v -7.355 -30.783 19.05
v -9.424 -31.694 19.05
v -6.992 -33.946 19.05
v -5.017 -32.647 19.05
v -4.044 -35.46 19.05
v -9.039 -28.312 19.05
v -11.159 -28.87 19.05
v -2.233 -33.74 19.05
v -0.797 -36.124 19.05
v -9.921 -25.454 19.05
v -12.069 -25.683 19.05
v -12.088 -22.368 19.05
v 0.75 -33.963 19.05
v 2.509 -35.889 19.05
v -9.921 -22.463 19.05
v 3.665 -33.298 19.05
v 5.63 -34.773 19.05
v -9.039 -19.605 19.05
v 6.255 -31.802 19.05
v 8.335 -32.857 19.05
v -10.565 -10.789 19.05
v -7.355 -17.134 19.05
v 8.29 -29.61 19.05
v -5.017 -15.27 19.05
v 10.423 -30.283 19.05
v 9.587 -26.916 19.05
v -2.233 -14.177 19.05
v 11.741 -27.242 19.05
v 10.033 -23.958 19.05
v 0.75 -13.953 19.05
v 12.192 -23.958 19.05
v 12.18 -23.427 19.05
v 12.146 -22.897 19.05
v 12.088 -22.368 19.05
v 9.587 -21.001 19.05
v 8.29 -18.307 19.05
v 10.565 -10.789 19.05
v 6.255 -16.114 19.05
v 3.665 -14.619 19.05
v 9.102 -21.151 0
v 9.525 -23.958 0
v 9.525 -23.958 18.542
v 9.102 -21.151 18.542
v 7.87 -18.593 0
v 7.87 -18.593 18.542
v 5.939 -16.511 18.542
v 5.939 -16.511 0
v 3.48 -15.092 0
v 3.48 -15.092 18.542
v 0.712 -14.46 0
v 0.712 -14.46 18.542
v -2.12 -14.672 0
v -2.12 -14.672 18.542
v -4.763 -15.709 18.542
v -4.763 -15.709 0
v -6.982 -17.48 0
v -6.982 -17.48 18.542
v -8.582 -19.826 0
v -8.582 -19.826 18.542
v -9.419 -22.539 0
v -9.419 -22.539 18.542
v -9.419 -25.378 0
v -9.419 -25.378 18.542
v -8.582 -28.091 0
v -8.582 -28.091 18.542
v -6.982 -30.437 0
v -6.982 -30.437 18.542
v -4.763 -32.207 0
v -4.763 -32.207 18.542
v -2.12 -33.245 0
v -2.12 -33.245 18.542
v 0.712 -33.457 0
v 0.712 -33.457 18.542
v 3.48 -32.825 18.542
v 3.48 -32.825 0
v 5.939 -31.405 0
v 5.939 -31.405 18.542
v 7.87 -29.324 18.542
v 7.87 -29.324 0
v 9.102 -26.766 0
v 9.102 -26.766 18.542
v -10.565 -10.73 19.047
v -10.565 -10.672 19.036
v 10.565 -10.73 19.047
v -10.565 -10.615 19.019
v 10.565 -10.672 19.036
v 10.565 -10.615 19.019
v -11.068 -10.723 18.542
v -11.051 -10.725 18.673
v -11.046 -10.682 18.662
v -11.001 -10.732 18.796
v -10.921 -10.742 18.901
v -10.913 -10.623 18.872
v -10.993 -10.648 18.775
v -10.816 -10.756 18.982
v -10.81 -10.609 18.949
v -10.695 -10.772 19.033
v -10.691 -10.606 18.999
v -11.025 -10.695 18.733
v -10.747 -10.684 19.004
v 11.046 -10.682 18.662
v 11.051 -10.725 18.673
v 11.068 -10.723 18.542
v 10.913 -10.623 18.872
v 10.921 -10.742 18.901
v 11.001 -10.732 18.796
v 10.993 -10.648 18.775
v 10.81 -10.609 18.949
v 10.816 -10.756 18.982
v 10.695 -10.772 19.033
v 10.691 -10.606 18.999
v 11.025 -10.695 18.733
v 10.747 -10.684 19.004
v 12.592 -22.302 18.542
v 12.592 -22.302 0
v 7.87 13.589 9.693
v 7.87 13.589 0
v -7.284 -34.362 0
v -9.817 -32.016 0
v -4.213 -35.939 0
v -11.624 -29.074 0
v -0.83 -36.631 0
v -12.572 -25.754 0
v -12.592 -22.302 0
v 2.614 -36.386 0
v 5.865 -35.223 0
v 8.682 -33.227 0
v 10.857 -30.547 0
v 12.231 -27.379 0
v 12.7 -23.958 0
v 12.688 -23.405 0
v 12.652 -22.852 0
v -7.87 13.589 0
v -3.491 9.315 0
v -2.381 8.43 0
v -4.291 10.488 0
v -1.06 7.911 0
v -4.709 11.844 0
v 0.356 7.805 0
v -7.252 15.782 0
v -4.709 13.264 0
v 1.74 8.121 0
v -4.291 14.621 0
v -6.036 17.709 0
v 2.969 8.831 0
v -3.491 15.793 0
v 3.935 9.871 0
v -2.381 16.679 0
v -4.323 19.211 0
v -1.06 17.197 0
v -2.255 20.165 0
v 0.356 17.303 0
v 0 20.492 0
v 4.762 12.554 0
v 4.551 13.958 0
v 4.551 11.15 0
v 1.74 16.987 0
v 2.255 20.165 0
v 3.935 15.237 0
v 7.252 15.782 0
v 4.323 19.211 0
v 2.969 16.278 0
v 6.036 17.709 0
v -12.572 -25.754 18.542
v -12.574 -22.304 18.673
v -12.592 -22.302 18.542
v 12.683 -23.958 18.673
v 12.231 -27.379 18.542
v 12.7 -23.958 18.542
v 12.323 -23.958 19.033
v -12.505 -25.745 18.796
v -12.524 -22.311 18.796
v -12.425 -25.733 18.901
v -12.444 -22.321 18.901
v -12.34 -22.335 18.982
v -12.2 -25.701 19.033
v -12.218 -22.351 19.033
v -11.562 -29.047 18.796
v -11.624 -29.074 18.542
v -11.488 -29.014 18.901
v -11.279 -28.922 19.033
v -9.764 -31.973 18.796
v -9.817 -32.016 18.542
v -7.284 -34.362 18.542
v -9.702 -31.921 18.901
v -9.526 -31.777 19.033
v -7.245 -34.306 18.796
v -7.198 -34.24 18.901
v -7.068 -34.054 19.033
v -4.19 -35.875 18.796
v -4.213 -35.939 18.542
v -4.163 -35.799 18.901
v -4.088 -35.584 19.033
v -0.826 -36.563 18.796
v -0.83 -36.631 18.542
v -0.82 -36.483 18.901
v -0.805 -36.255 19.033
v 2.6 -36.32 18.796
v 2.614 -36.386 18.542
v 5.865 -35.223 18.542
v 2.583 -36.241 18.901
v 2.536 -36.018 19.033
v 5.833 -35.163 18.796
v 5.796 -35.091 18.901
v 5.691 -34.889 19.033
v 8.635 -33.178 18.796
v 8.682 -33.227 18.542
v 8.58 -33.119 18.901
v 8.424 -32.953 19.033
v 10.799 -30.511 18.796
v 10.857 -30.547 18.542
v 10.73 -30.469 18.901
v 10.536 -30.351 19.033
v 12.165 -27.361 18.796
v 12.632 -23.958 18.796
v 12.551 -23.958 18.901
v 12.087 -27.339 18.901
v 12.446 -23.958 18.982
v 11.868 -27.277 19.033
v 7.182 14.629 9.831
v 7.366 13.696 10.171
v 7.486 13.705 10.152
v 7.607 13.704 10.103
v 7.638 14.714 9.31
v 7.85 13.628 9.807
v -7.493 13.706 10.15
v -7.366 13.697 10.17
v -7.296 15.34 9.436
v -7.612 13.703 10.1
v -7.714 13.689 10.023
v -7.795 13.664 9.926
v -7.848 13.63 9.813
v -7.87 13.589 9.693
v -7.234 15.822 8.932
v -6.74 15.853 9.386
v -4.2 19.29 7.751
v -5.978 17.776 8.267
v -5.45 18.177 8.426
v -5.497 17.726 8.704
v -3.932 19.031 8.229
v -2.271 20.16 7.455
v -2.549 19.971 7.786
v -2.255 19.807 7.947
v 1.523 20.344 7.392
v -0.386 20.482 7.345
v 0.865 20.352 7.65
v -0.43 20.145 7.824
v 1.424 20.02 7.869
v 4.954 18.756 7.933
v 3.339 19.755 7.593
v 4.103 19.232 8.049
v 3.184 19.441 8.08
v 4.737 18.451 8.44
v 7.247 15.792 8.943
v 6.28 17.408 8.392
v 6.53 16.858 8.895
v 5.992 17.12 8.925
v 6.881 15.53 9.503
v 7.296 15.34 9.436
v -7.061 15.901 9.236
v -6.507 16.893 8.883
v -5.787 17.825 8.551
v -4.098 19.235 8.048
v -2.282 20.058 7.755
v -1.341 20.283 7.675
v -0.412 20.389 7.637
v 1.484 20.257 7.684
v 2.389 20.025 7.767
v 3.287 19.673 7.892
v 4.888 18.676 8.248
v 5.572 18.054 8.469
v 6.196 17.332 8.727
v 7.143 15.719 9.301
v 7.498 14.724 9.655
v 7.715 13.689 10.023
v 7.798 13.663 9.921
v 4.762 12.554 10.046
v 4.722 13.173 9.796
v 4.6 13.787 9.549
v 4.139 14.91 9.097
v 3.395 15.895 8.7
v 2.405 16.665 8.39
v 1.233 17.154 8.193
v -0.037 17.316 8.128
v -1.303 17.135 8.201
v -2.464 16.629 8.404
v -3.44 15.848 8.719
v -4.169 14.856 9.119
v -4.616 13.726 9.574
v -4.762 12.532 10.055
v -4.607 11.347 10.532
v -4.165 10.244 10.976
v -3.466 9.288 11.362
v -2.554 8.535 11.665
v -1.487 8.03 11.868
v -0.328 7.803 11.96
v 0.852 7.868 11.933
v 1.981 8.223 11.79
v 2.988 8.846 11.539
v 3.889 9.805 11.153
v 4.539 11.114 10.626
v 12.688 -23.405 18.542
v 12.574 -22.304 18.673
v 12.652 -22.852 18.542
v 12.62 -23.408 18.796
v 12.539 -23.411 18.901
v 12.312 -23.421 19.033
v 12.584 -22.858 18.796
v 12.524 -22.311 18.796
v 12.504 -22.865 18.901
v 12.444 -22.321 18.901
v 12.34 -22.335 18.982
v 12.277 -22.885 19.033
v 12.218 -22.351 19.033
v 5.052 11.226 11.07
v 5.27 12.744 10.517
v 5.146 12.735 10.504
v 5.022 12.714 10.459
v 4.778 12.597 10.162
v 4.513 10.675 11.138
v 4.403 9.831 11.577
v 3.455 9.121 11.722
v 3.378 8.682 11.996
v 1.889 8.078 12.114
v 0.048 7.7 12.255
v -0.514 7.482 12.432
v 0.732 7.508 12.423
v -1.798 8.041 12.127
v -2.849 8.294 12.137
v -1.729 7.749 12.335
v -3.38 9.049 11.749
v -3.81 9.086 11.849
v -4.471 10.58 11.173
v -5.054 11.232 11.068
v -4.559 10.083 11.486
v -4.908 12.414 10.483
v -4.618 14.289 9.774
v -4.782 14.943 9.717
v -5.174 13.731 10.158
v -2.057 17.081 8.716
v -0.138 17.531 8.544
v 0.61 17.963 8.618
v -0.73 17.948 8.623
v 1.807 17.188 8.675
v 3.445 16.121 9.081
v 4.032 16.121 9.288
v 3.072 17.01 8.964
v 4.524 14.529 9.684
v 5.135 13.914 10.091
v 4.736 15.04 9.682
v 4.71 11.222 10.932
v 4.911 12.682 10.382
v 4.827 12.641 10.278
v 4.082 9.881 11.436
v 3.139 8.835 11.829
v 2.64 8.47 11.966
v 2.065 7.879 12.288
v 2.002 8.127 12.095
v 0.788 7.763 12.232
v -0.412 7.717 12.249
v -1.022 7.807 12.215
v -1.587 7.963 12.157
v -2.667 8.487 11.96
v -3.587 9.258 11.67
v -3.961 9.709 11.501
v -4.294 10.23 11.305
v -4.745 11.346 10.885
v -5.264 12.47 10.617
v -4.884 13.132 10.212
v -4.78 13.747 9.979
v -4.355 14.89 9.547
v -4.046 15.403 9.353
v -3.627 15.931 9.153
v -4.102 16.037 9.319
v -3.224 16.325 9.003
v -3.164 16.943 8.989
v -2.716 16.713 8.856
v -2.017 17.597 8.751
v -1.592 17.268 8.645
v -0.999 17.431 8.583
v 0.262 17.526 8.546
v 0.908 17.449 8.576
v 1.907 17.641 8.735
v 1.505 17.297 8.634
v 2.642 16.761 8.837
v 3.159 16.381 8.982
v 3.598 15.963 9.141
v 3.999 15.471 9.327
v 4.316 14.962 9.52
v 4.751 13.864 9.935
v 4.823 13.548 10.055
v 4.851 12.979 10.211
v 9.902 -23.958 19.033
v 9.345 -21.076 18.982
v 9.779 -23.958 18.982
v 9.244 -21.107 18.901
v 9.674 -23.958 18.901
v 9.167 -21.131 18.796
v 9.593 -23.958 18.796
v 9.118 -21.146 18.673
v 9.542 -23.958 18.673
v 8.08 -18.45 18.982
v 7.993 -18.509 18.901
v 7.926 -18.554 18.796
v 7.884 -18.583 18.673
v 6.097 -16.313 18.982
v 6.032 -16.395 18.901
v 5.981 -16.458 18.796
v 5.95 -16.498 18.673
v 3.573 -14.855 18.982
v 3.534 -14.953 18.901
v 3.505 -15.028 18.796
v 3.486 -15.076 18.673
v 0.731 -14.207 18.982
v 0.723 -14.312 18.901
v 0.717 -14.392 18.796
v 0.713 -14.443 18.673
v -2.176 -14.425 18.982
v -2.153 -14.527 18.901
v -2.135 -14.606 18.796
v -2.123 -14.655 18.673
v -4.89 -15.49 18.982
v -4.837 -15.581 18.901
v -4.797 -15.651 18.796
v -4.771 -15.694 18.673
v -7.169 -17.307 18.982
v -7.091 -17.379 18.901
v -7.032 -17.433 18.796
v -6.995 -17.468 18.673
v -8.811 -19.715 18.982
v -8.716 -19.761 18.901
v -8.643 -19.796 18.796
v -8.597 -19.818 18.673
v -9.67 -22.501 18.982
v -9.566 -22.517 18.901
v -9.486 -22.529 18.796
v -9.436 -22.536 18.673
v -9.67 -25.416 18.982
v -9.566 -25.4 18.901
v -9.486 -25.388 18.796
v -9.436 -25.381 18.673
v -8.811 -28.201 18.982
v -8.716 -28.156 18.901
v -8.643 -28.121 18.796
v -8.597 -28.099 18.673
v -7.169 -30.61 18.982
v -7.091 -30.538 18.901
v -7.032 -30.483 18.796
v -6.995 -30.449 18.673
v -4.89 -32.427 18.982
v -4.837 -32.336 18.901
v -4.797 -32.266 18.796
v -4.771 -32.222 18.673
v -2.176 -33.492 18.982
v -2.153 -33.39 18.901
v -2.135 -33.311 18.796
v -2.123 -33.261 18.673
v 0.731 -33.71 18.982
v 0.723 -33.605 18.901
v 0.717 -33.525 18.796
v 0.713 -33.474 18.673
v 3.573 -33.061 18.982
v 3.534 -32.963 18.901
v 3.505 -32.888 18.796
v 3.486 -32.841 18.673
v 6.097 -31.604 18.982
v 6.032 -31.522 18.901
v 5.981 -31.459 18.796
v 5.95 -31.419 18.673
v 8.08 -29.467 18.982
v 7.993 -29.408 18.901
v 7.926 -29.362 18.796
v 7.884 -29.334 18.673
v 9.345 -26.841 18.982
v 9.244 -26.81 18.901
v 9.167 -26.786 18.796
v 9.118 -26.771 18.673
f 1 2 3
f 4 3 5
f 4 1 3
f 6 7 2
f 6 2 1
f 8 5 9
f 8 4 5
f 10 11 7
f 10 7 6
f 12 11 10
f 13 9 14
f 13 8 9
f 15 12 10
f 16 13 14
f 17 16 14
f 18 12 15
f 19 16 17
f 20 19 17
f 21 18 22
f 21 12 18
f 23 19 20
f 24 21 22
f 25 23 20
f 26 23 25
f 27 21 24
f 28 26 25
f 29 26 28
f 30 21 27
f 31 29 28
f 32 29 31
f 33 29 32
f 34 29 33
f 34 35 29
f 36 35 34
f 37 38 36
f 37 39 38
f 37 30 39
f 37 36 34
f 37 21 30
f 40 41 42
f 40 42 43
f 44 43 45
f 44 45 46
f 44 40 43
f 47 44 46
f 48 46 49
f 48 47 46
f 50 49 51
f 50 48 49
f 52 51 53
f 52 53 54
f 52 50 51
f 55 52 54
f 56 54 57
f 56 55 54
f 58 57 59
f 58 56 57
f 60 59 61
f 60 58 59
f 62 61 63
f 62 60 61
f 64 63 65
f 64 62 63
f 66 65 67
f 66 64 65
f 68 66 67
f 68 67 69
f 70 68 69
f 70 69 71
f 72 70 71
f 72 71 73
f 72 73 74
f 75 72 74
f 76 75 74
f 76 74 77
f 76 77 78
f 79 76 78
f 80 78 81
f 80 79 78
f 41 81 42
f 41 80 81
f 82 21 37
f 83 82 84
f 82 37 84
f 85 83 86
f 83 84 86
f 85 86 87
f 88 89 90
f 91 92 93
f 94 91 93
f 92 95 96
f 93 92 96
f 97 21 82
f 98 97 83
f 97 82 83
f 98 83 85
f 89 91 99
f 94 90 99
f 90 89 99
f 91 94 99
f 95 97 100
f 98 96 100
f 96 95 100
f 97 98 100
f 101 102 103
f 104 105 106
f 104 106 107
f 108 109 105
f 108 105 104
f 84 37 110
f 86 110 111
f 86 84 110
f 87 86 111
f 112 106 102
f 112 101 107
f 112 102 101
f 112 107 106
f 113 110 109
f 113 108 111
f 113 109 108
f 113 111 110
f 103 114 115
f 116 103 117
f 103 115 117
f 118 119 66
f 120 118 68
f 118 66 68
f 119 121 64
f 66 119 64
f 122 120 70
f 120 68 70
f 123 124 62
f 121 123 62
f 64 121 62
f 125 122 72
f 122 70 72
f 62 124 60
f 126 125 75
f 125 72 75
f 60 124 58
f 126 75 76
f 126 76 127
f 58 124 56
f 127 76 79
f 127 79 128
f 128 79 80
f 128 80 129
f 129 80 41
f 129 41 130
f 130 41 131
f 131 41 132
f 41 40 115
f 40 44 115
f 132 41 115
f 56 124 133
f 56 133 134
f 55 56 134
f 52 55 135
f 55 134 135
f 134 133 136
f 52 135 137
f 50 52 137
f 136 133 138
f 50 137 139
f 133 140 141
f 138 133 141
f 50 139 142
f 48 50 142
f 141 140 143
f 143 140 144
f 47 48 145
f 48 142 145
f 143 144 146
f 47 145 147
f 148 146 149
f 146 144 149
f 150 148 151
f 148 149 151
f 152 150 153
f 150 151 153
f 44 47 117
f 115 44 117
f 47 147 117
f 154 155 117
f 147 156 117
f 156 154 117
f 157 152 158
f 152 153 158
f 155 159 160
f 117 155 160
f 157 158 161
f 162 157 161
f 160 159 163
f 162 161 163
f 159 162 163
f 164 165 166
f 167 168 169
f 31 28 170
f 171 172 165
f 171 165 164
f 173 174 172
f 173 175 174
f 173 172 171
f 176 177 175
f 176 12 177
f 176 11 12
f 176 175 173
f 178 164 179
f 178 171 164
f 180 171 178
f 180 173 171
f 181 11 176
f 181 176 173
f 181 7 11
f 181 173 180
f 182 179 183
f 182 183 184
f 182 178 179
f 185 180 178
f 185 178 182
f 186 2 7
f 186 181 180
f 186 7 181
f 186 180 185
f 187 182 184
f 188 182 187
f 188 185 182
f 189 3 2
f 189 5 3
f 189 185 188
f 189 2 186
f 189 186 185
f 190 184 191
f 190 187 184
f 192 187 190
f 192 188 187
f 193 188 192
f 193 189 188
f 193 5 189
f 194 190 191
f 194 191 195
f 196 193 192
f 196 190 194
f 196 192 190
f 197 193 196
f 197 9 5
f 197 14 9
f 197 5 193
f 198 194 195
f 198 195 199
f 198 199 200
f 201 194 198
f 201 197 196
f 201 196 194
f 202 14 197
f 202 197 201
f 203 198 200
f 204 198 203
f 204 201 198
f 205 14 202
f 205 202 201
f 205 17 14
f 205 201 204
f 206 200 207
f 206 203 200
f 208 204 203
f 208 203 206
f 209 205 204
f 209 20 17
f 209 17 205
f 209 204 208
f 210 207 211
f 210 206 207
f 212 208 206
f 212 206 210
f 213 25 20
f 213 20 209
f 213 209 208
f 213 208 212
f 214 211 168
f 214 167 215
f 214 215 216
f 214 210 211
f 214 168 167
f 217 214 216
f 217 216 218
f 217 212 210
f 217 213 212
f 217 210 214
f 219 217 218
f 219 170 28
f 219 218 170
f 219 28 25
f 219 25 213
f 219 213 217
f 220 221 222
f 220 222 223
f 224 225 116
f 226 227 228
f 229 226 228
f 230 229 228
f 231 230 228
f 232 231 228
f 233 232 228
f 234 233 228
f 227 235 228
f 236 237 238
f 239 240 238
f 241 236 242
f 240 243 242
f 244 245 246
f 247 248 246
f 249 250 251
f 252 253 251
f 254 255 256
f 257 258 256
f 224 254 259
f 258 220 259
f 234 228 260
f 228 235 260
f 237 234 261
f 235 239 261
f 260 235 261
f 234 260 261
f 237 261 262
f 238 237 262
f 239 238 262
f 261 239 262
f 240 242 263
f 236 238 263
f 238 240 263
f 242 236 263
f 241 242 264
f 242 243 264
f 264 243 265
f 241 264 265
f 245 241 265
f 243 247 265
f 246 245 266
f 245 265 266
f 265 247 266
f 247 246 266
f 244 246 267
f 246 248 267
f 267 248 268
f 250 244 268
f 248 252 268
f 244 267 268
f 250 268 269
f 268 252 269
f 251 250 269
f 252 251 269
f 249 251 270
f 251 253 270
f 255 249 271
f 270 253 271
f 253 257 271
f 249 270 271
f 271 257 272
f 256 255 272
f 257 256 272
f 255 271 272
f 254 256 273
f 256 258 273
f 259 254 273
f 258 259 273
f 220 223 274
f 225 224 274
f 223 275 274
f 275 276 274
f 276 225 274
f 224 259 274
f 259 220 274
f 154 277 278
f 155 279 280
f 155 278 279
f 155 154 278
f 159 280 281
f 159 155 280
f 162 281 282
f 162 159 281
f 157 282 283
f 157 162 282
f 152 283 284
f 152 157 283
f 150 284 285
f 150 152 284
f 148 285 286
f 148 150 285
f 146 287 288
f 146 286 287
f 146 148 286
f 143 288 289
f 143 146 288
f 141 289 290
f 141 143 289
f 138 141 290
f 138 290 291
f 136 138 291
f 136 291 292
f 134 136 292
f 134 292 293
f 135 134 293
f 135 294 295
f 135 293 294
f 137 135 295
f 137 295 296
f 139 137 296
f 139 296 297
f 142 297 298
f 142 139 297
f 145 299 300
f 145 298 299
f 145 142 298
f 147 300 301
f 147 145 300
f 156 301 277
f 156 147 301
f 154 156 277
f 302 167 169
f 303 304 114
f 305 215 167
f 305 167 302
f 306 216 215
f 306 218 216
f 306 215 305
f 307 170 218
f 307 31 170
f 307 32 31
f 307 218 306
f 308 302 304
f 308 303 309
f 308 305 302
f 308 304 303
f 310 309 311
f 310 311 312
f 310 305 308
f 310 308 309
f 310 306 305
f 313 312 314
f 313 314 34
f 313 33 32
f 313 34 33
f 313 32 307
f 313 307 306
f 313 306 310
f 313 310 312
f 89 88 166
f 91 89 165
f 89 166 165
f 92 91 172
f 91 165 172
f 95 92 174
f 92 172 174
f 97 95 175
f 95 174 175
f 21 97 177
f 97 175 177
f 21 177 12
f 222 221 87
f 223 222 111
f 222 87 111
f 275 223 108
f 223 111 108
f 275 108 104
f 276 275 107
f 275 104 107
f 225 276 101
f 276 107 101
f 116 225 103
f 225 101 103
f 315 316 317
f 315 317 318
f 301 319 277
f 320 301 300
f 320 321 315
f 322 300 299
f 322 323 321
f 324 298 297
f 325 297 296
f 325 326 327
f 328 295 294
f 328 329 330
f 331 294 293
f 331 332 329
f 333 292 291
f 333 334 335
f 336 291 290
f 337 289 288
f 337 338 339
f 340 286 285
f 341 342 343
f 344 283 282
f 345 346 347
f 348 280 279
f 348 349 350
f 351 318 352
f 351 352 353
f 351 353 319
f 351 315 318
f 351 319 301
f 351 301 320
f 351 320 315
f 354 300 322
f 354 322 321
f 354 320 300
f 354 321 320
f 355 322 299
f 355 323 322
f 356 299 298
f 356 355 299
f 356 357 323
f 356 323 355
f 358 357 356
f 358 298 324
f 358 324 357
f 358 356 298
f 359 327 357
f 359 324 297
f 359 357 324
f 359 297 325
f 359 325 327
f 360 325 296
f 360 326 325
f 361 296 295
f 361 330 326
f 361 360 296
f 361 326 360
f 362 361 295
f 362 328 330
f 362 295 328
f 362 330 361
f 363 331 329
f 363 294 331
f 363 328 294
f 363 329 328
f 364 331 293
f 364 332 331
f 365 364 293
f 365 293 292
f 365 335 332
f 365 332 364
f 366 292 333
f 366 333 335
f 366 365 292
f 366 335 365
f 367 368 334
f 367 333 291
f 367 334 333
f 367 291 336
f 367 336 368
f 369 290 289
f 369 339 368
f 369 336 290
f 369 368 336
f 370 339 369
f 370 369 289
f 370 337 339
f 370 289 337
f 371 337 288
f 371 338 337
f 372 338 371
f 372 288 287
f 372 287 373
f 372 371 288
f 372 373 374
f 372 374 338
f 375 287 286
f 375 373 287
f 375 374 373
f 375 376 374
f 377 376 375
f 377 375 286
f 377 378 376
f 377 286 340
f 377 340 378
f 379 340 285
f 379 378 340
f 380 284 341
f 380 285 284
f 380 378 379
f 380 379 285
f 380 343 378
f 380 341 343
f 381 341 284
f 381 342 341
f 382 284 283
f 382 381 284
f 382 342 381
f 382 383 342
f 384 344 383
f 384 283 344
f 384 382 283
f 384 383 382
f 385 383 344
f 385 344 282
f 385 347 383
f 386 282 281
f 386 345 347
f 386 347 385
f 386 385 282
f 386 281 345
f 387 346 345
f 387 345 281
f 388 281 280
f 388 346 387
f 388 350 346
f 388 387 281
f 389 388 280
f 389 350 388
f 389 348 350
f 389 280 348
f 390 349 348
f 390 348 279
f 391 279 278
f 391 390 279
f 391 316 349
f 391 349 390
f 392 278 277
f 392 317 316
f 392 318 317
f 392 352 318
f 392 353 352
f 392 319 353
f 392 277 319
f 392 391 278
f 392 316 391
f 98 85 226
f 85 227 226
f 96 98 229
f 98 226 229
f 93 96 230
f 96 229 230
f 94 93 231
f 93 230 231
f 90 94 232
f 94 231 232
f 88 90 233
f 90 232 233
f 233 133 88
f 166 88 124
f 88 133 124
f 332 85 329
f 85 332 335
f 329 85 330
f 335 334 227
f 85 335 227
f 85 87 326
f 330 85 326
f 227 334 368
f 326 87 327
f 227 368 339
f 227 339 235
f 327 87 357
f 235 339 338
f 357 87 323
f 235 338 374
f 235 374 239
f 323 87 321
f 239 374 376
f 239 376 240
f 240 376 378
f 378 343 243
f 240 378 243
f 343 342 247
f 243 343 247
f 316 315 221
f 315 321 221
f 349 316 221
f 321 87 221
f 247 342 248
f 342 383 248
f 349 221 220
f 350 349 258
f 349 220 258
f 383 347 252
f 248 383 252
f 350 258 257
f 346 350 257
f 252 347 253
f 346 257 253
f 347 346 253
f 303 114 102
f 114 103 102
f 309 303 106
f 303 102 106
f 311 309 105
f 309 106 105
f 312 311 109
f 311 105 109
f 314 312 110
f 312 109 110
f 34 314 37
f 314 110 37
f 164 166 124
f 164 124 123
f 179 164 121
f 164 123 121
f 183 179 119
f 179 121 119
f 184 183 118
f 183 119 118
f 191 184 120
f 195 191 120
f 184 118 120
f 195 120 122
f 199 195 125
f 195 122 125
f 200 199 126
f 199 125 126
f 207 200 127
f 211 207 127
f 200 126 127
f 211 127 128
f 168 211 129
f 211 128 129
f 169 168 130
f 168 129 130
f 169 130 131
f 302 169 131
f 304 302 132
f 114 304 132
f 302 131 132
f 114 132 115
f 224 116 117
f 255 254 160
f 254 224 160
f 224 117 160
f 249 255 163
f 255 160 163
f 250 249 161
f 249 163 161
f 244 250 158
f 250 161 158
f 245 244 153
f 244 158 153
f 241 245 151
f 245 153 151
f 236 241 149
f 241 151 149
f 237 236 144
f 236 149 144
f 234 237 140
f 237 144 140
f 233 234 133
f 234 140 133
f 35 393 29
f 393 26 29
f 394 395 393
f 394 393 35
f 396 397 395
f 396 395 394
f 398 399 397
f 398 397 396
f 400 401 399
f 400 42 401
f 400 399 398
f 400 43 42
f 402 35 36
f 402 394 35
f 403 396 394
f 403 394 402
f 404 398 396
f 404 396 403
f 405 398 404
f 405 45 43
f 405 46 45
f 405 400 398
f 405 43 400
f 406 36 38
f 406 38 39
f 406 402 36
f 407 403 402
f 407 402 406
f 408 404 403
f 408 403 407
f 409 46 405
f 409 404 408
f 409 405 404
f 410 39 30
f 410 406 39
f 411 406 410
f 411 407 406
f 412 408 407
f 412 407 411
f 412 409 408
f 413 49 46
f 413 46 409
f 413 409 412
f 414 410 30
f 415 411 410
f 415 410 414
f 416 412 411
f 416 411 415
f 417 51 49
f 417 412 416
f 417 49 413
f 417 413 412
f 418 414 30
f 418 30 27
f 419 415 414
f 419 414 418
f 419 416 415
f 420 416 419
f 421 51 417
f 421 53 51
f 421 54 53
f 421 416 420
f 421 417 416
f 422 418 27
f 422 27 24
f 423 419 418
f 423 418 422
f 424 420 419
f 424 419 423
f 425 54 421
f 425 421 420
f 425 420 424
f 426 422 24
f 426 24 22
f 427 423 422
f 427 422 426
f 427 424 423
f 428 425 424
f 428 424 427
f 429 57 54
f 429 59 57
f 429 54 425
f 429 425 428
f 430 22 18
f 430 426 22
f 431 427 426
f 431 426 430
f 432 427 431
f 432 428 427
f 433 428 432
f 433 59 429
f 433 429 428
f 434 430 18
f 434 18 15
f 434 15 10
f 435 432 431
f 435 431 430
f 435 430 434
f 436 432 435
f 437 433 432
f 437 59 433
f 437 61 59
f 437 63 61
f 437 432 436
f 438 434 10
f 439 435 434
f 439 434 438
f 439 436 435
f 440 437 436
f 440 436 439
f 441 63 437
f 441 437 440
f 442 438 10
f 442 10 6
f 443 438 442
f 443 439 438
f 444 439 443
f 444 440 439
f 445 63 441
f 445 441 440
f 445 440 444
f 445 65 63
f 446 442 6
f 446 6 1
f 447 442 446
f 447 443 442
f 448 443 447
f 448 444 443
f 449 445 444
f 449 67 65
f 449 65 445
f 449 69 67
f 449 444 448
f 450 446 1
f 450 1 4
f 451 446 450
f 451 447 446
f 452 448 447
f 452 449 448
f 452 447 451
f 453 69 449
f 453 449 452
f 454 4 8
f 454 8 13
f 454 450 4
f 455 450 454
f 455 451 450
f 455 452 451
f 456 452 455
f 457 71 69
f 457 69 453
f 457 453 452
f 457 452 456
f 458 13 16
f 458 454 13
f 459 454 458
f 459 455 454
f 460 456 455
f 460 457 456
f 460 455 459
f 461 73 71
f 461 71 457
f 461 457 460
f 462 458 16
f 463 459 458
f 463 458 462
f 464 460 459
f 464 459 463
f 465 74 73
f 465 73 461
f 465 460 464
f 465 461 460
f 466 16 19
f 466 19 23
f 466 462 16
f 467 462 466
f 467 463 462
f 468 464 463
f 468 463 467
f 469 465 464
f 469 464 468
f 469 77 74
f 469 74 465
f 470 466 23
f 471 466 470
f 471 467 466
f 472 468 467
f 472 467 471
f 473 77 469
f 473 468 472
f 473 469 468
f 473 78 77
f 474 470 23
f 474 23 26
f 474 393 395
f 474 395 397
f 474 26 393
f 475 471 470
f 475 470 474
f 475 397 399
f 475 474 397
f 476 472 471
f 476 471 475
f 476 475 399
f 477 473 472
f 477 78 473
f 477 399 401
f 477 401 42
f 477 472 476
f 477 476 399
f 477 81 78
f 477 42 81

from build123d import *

# Parameters (mm, degrees)
F0_R     = 4.7625
F0_R_2   = 9.525
F1_DEPTH = 19.05
F3_DEPTH = 12.7
F4_R     = 0.508


with BuildPart() as f1:
    # F0 (on Top) → F1 (new body)
    with BuildSketch(Plane.XY):
        with BuildLine():
            ThreePointArc((-12.5915025207, -22.3018423613), (0, -11.2583641004), (12.5915025207, -22.3018423613))
            Line((12.5915025207, -22.3018423613), (7.8696890754, 13.5894619866))
            ThreePointArc((7.8696890754, 13.5894619866), (7.9205291265, 13.0729081107), (7.9375, 12.5541358996))
            ThreePointArc((7.9375, 12.5541358996), (-0.518772211, 4.6336067732), (-7.8696890754, 13.5894619866))
            Line((-7.8696890754, 13.5894619866), (-12.5915025207, -22.3018423613))
        make_face()
        with BuildLine():
            ThreePointArc((7.9375, 12.5541358996), (7.9205291265, 13.0729081107), (7.8696890754, 13.5894619866))
            ThreePointArc((7.8696890754, 13.5894619866), (0, 20.4916358996), (-7.8696890754, 13.5894619866))
            ThreePointArc((-7.8696890754, 13.5894619866), (-0.518772211, 4.6336067732), (7.9375, 12.5541358996))
        make_face()
        with Locations((0, 12.5541358996)):
            Circle(F0_R, mode=Mode.SUBTRACT)
        with BuildLine():
            ThreePointArc((-12.5915025207, -22.3018423613), (-0.8300355377, -36.6312107027), (12.7, -23.9583641004))
            ThreePointArc((12.7, -23.9583641004), (12.6728466023, -23.1283285627), (12.5915025207, -22.3018423613))
            ThreePointArc((12.5915025207, -22.3018423613), (0, -11.2583641004), (-12.5915025207, -22.3018423613))
        make_face()
        with Locations((0, -23.9583641004)):
            Circle(F0_R_2, mode=Mode.SUBTRACT)
    extrude(amount=F1_DEPTH)

    # F2 (on Right) → F3 (cut, symmetric)
    with BuildSketch(Plane.YZ):
        Polygon((27.539246283, 19.6871260232), (-12.4499707691, 19.6871260232), (27.539246283, 5.1322413246), align=None)
    extrude(amount=F3_DEPTH, both=True, mode=Mode.SUBTRACT)

    # F4
    f4_edges = [f1.edges().sort_by_distance(p)[0] for p in [
        (0, -10.699481, 19.05),
        (0, -36.658364, 19.05),
        (9.4674, 1.44499, 14.629774),
        (-9.525, -23.958364, 19.05),
        (-4.7625, 12.554128, 10.586378),
    ]]
    fillet(f4_edges, radius=F4_R)


solid = f1.part
